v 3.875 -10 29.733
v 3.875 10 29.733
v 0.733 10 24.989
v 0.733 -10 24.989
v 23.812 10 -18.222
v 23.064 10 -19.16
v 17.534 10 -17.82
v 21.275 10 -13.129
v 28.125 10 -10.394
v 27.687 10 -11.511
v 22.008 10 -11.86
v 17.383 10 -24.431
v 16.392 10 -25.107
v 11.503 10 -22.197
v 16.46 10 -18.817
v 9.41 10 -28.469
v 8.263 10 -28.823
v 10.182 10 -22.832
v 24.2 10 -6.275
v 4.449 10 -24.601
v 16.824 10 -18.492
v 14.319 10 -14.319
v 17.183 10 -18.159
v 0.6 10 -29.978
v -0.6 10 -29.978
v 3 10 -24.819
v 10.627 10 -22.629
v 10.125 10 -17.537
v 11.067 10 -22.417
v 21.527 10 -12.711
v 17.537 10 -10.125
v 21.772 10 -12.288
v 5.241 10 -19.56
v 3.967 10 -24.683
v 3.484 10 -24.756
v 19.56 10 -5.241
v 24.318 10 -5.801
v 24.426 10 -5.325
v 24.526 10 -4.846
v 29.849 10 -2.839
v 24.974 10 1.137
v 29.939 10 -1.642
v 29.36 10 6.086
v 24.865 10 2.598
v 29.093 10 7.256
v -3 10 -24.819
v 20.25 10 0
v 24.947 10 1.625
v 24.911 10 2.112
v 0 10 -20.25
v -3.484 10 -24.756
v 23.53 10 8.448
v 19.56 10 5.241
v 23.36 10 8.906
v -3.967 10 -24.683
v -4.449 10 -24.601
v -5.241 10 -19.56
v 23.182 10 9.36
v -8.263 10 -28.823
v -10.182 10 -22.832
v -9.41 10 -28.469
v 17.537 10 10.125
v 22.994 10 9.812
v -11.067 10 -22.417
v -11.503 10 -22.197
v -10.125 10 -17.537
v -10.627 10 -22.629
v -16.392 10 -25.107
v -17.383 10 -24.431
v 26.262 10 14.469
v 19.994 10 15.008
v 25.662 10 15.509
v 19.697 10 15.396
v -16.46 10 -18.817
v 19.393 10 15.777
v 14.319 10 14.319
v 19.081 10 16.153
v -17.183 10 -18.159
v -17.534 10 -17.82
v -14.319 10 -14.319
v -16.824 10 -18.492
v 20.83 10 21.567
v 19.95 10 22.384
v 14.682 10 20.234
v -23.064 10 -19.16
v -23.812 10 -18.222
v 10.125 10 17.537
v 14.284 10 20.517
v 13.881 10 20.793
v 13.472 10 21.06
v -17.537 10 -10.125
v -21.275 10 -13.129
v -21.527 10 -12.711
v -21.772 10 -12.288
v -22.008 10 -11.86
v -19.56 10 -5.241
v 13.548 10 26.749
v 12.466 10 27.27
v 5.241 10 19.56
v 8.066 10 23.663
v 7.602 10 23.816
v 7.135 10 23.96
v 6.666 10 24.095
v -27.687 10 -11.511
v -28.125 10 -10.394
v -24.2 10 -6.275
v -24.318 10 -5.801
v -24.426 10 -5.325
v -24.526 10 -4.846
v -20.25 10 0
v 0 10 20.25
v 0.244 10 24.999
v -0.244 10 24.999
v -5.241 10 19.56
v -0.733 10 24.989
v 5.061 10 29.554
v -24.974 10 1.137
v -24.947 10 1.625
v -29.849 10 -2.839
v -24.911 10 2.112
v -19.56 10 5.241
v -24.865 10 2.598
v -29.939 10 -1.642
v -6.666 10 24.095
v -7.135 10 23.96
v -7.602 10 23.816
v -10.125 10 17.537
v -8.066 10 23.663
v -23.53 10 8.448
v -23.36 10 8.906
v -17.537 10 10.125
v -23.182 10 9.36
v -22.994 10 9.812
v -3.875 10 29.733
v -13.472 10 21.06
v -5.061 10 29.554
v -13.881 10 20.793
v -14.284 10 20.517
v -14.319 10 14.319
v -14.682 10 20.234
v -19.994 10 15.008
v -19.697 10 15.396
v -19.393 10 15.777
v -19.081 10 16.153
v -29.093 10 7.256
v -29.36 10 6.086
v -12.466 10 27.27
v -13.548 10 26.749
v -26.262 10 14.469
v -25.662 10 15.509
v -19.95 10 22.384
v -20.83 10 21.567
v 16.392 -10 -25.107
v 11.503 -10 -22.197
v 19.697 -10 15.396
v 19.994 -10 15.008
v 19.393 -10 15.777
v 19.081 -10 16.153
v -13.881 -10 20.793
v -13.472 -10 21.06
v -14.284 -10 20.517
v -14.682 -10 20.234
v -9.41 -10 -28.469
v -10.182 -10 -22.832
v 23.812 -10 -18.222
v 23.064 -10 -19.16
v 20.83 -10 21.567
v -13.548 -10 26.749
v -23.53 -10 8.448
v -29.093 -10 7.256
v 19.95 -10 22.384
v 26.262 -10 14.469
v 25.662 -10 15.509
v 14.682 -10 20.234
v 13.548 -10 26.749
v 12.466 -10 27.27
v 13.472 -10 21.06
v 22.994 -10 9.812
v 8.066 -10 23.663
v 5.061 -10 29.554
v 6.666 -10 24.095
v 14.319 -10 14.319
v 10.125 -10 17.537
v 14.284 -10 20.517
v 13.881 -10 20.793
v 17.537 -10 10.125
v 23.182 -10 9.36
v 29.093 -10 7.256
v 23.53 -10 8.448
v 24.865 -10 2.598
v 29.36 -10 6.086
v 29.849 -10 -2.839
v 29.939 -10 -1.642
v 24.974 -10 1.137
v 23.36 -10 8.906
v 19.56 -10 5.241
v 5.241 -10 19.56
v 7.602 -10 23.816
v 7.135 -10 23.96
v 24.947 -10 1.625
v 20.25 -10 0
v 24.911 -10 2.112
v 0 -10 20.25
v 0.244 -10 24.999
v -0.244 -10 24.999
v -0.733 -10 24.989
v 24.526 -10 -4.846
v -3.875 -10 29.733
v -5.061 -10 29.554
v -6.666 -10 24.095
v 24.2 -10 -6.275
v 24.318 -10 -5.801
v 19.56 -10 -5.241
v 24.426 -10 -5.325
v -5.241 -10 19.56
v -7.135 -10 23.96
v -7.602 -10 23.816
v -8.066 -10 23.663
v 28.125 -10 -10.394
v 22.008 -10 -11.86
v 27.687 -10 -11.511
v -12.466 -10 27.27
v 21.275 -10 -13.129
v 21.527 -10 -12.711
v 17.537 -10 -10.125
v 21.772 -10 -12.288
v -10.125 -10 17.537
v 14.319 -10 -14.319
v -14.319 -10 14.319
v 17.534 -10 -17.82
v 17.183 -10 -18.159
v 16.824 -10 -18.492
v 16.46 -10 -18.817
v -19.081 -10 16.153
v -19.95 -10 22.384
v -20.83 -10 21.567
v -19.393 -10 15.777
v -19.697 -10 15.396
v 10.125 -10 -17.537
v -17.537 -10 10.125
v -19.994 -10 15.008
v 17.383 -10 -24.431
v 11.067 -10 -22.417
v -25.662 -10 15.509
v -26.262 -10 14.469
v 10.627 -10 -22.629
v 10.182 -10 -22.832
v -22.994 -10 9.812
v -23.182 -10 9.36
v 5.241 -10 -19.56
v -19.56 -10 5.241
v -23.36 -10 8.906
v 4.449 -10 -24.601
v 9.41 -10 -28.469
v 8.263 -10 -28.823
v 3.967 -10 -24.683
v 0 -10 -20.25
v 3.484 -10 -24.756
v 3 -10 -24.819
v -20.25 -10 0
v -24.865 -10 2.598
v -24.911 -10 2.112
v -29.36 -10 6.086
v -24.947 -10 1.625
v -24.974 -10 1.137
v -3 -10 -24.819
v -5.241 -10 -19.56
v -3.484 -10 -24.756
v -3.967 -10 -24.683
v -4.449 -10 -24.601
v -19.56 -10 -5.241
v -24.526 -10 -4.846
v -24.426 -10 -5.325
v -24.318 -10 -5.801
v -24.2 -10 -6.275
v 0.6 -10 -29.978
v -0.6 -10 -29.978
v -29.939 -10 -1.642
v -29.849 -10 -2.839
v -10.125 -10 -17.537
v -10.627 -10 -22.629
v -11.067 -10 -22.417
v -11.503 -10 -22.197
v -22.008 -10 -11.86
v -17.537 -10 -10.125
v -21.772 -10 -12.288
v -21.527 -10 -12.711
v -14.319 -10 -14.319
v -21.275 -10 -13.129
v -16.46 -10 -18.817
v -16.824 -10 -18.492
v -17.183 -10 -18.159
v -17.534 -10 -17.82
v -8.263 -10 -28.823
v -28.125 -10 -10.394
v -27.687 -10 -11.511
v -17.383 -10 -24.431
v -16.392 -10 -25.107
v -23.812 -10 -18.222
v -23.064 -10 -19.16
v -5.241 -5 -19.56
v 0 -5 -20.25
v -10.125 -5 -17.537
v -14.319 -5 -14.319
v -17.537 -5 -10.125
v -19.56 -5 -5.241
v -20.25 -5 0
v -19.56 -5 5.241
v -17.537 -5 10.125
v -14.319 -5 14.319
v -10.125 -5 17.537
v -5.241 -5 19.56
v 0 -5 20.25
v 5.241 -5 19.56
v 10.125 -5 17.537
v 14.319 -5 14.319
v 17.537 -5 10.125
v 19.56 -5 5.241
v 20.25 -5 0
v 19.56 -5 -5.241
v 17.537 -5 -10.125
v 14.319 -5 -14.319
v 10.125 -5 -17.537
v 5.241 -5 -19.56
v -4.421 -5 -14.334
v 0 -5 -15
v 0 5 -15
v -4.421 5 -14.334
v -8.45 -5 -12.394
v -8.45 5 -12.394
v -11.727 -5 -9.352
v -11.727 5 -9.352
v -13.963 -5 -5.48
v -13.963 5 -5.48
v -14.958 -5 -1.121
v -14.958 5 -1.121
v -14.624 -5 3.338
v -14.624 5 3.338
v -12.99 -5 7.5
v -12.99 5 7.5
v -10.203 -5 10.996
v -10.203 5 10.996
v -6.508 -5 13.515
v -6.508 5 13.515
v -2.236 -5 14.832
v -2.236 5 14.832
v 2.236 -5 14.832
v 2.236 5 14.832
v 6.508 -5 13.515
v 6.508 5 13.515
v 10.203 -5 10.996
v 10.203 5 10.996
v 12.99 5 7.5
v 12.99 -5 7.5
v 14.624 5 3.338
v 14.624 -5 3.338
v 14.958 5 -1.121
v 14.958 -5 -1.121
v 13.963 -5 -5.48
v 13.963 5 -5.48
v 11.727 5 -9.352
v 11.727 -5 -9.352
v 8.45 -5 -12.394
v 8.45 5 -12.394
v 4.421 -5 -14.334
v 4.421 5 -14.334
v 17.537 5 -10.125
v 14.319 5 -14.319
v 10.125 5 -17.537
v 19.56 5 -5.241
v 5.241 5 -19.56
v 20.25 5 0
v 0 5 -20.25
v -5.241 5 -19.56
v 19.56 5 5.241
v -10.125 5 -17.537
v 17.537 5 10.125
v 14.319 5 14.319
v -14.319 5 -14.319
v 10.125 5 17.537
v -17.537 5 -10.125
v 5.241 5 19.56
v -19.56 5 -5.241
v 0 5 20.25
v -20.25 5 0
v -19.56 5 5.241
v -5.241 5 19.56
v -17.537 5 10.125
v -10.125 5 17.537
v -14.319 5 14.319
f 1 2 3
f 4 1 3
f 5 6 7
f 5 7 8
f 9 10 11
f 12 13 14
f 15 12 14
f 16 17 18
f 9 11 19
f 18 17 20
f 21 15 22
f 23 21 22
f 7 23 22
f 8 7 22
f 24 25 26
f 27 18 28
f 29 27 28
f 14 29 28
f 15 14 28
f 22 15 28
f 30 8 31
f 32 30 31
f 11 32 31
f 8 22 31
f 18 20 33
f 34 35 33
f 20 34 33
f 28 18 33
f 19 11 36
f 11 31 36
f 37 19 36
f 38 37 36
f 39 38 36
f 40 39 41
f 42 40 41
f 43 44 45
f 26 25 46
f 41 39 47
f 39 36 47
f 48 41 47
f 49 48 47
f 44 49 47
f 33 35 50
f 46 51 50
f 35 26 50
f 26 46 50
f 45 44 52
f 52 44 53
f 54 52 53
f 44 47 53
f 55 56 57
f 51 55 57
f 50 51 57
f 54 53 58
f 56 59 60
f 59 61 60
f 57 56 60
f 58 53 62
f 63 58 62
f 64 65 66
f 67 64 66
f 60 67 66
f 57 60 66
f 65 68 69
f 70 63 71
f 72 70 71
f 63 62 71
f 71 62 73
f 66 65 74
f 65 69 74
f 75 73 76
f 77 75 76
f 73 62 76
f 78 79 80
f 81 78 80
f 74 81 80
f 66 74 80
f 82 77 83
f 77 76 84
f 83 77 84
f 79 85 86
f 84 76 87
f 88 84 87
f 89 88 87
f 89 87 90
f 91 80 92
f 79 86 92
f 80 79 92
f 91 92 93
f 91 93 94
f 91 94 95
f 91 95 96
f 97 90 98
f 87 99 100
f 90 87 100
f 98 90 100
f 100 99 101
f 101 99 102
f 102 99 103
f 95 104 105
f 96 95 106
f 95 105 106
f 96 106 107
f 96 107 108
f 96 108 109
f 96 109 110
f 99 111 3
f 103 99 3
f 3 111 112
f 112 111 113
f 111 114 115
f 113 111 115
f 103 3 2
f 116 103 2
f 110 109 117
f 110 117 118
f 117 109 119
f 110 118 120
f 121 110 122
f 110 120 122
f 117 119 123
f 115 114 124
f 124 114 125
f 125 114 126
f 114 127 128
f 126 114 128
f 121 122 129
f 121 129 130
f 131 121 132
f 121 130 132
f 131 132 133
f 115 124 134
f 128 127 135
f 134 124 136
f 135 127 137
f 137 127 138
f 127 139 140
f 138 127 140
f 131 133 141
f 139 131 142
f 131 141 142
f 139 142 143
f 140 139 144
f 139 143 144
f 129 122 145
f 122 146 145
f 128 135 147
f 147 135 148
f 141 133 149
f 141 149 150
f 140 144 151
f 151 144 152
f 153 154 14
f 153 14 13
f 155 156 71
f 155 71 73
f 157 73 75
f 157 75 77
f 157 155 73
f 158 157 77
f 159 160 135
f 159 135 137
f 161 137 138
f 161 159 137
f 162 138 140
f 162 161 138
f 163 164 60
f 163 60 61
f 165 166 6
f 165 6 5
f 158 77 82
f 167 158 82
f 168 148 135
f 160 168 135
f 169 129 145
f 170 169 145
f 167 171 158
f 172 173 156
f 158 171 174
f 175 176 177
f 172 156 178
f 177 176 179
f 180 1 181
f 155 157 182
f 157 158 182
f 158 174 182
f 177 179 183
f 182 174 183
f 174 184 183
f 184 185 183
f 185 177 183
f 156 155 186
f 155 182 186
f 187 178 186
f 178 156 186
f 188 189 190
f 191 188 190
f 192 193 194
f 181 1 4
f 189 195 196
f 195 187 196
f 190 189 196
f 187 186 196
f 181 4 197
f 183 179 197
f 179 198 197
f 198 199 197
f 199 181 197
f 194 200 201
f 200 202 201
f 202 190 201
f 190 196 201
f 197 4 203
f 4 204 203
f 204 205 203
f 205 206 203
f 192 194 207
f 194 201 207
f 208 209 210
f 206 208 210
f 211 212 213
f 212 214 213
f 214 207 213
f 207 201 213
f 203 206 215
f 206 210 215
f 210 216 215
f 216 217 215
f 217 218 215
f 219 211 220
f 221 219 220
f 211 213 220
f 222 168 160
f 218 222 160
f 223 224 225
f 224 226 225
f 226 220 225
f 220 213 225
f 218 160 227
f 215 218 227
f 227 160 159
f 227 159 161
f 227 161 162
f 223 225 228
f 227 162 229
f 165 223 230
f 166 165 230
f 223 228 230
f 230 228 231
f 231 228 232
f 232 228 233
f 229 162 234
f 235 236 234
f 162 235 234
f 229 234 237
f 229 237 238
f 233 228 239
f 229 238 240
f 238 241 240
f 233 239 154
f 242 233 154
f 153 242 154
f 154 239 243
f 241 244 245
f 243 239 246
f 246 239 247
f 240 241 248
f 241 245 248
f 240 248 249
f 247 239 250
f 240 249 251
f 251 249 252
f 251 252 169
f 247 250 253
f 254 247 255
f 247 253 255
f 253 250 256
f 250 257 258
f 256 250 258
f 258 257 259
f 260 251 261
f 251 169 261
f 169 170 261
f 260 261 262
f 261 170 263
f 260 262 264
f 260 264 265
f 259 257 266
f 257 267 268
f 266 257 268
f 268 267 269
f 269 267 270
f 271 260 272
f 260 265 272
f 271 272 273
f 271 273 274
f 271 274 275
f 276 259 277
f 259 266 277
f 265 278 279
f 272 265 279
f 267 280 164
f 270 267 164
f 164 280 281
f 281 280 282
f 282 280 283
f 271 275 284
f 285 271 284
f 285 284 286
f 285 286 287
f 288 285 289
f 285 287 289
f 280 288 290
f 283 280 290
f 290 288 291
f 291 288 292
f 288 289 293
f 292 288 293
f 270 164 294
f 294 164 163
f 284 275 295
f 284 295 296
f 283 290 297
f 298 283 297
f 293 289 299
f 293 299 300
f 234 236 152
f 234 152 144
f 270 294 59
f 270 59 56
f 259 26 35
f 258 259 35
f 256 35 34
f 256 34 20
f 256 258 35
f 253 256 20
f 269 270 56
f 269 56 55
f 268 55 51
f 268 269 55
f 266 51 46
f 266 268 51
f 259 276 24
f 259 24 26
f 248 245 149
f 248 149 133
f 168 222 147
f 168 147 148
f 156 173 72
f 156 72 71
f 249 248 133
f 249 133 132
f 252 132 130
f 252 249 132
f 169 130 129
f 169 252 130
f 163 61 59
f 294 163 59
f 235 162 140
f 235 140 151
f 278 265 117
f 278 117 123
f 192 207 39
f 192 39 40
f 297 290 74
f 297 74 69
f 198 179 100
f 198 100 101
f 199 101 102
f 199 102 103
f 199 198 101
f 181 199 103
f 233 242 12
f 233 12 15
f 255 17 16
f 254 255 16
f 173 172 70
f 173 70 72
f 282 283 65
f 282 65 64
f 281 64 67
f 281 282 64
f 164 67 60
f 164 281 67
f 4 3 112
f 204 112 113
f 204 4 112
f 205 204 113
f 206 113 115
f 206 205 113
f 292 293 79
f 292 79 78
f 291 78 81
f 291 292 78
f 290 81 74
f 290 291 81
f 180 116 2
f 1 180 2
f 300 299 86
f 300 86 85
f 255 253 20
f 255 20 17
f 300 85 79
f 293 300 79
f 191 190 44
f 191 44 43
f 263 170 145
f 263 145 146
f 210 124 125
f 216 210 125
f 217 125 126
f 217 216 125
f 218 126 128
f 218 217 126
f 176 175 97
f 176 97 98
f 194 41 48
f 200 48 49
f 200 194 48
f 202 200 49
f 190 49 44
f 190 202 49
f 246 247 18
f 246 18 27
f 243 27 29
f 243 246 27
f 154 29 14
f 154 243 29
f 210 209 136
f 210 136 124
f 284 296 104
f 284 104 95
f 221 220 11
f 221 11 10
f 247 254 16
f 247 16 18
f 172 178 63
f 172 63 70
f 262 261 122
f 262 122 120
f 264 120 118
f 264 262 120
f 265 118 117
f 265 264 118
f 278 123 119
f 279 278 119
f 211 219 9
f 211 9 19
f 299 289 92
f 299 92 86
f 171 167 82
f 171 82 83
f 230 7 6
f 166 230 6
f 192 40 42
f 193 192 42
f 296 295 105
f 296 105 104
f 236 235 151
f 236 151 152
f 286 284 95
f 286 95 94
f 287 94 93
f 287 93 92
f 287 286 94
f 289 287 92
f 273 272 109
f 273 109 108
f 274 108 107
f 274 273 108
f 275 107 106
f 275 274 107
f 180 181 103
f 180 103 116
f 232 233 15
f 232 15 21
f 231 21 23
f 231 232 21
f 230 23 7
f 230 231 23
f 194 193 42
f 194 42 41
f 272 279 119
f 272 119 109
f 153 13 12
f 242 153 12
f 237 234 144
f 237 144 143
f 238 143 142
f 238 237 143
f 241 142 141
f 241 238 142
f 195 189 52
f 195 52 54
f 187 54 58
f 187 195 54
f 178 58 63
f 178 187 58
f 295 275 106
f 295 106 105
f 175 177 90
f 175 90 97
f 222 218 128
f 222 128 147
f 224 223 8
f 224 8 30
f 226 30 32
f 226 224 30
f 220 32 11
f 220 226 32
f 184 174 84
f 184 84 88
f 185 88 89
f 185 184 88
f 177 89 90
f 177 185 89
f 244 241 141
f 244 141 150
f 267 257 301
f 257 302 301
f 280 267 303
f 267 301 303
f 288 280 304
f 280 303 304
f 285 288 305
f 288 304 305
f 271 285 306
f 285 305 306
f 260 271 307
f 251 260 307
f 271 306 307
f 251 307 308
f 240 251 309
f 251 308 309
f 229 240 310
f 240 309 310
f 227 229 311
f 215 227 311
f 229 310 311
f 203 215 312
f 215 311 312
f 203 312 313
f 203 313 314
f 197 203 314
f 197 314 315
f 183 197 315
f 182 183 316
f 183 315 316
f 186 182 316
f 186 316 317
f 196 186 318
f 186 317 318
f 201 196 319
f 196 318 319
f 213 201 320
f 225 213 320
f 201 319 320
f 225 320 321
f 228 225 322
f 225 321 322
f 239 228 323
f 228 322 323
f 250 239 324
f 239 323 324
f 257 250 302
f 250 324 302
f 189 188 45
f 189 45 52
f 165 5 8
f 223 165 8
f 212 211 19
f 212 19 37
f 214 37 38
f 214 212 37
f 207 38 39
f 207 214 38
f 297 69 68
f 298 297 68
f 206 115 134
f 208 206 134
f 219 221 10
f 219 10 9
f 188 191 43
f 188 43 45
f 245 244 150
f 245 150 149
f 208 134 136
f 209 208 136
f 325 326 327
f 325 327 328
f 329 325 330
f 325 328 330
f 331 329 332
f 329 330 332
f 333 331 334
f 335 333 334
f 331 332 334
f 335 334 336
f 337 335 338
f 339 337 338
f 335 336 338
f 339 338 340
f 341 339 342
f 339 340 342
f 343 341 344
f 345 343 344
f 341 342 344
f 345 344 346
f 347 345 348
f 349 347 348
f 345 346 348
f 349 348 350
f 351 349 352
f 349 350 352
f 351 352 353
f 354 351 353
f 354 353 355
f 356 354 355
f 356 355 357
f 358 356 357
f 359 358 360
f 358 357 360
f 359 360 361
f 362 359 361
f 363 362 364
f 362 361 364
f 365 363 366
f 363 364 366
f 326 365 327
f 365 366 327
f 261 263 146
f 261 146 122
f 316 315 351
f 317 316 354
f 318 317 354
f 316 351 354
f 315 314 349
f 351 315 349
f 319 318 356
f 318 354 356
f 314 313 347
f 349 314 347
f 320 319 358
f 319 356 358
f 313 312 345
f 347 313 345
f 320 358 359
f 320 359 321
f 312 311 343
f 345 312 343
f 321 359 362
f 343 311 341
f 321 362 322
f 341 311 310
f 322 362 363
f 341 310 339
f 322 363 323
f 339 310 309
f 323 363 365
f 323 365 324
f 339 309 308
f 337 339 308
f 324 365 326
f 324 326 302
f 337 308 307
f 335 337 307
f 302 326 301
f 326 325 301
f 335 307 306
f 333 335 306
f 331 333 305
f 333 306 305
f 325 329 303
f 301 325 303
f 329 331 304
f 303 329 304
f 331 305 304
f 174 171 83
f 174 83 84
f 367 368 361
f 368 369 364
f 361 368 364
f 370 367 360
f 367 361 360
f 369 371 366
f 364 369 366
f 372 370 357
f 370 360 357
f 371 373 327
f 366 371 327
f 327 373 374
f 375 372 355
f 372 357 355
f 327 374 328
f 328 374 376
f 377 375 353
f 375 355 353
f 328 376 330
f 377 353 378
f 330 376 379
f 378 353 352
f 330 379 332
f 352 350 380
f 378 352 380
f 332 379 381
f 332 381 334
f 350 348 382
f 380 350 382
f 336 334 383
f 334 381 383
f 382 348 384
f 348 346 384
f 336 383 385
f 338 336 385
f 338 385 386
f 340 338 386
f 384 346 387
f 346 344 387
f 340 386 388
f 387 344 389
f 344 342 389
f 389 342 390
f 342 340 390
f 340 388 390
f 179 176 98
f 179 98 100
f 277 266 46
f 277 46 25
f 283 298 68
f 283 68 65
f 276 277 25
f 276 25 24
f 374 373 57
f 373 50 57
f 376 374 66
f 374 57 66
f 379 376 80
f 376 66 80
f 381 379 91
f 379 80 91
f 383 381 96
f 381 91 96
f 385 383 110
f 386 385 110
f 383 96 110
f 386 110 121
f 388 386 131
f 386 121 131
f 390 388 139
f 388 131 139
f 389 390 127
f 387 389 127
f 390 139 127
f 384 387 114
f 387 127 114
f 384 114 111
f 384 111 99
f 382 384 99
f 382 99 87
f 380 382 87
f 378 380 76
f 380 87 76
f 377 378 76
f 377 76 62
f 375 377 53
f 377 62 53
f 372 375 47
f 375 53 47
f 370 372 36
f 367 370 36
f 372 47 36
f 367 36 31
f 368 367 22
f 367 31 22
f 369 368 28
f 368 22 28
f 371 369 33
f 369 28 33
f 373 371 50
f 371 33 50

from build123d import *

# Parameters (mm, degrees)
CUT_EXTRUDE1_DEPTH      = 47.904157598
CUT_EXTRUDE1_DEPTH_BACK = 47.904157598
SKETCH2_R               = 30


with BuildPart() as part:
    # Sketch1 → Revolve1 (revolve)
    with BuildSketch(Plane(origin=(0, 0, 0), x_dir=(0, 0, -1), z_dir=(1, 0, 0))):
        Polygon((20.25, 10), (30, 10), (30, -10), (20.25, -10), (20.25, -5), (15, -5), (15, 5), (20.25, 5), align=None)
    revolve(axis=Axis((0, 0, 0), (0, 1, 0)))

    # Sketch2 → Cut-Extrude1 (cut, two sides: drawn at the far end of the back side and taken through both)
    with BuildSketch(Plane(origin=(0, 10, 0), x_dir=(1, 0, 0), z_dir=(0, 1, 0)).offset(-CUT_EXTRUDE1_DEPTH_BACK)):
        Circle(SKETCH2_R)
        with BuildLine():
            Line((-3, 24.819347292), (-0.6, 29.978082123))
            Line((-0.6, 29.978082123), (0.6, 29.978082123))
            Line((0.6, 29.978082123), (3, 24.819347292))
            ThreePointArc((3, 24.819347292), (3.726056654, 24.720770656), (4.448912622, 24.600958853))
            Line((4.448912622, 24.600958853), (8.262851141, 28.823093151))
            Line((8.262851141, 28.823093151), (9.409538508, 28.469386942))
            Line((9.409538508, 28.469386942), (10.182349457, 22.832427806))
            ThreePointArc((10.182349457, 22.832427806), (10.847093478, 22.524221698), (11.502519835, 22.19666726))
            Line((11.502519835, 22.19666726), (16.391511698, 25.107045865))
            Line((16.391511698, 25.107045865), (17.382998227, 24.431061795))
            Line((17.382998227, 24.431061795), (16.459952481, 18.816746912))
            ThreePointArc((16.459952481, 18.816746912), (17.004318444, 18.326296796), (17.534077682, 17.820104373))
            Line((17.534077682, 17.820104373), (23.063714507, 19.160127373))
            Line((23.063714507, 19.160127373), (23.811902269, 18.221929594))
            Line((23.811902269, 18.221929594), (21.275016493, 13.129115478))
            ThreePointArc((21.275016493, 13.129115478), (21.650635095, 12.5), (22.007655779, 11.86014701))
            Line((22.007655779, 11.86014701), (27.686605069, 11.510747481))
            Line((27.686605069, 11.510747481), (28.125014298, 10.393698982))
            Line((28.125014298, 10.393698982), (24.199701926, 6.274904518))
            ThreePointArc((24.199701926, 6.274904518), (24.373197805, 5.563023349), (24.525757082, 4.846363537))
            Line((24.525757082, 4.846363537), (29.849419269, 2.838587161))
            Line((29.849419269, 2.838587161), (29.939095382, 1.641942604))
            Line((29.939095382, 1.641942604), (24.974137644, -1.136859246))
            ThreePointArc((24.974137644, -1.136859246), (24.93009493, -1.86825234), (24.864637239, -2.598040603))
            Line((24.864637239, -2.598040603), (29.359981576, -6.085794085))
            Line((29.359981576, -6.085794085), (29.092956455, -7.25570758))
            Line((29.092956455, -7.25570758), (23.529511635, -8.447608076))
            ThreePointArc((23.529511635, -8.447608076), (23.271843716, -9.133525609), (22.99418526, -9.811597435))
            Line((22.99418526, -9.811597435), (26.261780675, -14.469425819))
            Line((26.261780675, -14.469425819), (25.661780675, -15.508656304))
            Line((25.661780675, -15.508656304), (19.99418526, -15.007749857))
            ThreePointArc((19.99418526, -15.007749857), (19.545787062, -15.587245046), (19.080599013, -16.153350777))
            Line((19.080599013, -16.153350777), (20.830105314, -21.567385572))
            Line((20.830105314, -21.567385572), (19.950443068, -22.383592857))
            Line((19.950443068, -22.383592857), (14.682287782, -20.234387203))
            ThreePointArc((14.682287782, -20.234387203), (14.083001452, -20.655969358), (13.471617809, -21.059808014))
            Line((13.471617809, -21.059808014), (13.547583684, -26.748988469))
            Line((13.547583684, -26.748988469), (12.466421042, -27.269648956))
            Line((12.466421042, -27.269648956), (8.065804602, -23.663110449))
            ThreePointArc((8.065804602, -23.663110449), (7.36887936, -23.889320145), (6.665624244, -24.095008891))
            Line((6.665624244, -24.095008891), (5.061299791, -29.553826355))
            Line((5.061299791, -29.553826355), (3.8747028, -29.732677074))
            Line((3.8747028, -29.732677074), (0.732639287, -24.989262488))
            ThreePointArc((0.732639287, -24.989262488), (0, -25), (-0.732639287, -24.989262488))
            Line((-0.732639287, -24.989262488), (-3.8747028, -29.732677074))
            Line((-3.8747028, -29.732677074), (-5.061299791, -29.553826355))
            Line((-5.061299791, -29.553826355), (-6.665624244, -24.095008891))
            ThreePointArc((-6.665624244, -24.095008891), (-7.36887936, -23.889320145), (-8.065804602, -23.663110449))
            Line((-8.065804602, -23.663110449), (-12.466421042, -27.269648956))
            Line((-12.466421042, -27.269648956), (-13.547583684, -26.748988469))
            Line((-13.547583684, -26.748988469), (-13.471617809, -21.059808014))
            ThreePointArc((-13.471617809, -21.059808014), (-14.083001452, -20.655969358), (-14.682287782, -20.234387203))
            Line((-14.682287782, -20.234387203), (-19.950443068, -22.383592857))
            Line((-19.950443068, -22.383592857), (-20.830105314, -21.567385572))
            Line((-20.830105314, -21.567385572), (-19.080599013, -16.153350777))
            ThreePointArc((-19.080599013, -16.153350777), (-19.545787062, -15.587245046), (-19.99418526, -15.007749857))
            Line((-19.99418526, -15.007749857), (-25.661780675, -15.508656304))
            Line((-25.661780675, -15.508656304), (-26.261780675, -14.469425819))
            Line((-26.261780675, -14.469425819), (-22.99418526, -9.811597435))
            ThreePointArc((-22.99418526, -9.811597435), (-23.271843716, -9.133525609), (-23.529511635, -8.447608076))
            Line((-23.529511635, -8.447608076), (-29.092956455, -7.25570758))
            Line((-29.092956455, -7.25570758), (-29.359981576, -6.085794085))
            Line((-29.359981576, -6.085794085), (-24.864637239, -2.598040603))
            ThreePointArc((-24.864637239, -2.598040603), (-24.93009493, -1.86825234), (-24.974137644, -1.136859246))
            Line((-24.974137644, -1.136859246), (-29.939095382, 1.641942604))
            Line((-29.939095382, 1.641942604), (-29.849419269, 2.838587161))
            Line((-29.849419269, 2.838587161), (-24.525757082, 4.846363537))
            ThreePointArc((-24.525757082, 4.846363537), (-24.373197805, 5.563023349), (-24.199701926, 6.274904518))
            Line((-24.199701926, 6.274904518), (-28.125014298, 10.393698982))
            Line((-28.125014298, 10.393698982), (-27.686605069, 11.510747481))
            Line((-27.686605069, 11.510747481), (-22.007655779, 11.86014701))
            ThreePointArc((-22.007655779, 11.86014701), (-21.650635095, 12.5), (-21.275016493, 13.129115478))
            Line((-21.275016493, 13.129115478), (-23.811902269, 18.221929594))
            Line((-23.811902269, 18.221929594), (-23.063714507, 19.160127373))
            Line((-23.063714507, 19.160127373), (-17.534077682, 17.820104373))
            ThreePointArc((-17.534077682, 17.820104373), (-17.004318444, 18.326296796), (-16.459952481, 18.816746912))
            Line((-16.459952481, 18.816746912), (-17.382998227, 24.431061795))
            Line((-17.382998227, 24.431061795), (-16.391511698, 25.107045865))
            Line((-16.391511698, 25.107045865), (-11.502519835, 22.19666726))
            ThreePointArc((-11.502519835, 22.19666726), (-10.847093478, 22.524221698), (-10.182349457, 22.832427806))
            Line((-10.182349457, 22.832427806), (-9.409538508, 28.469386942))
            Line((-9.409538508, 28.469386942), (-8.262851141, 28.823093151))
            Line((-8.262851141, 28.823093151), (-4.448912622, 24.600958853))
            ThreePointArc((-4.448912622, 24.600958853), (-3.726056654, 24.720770656), (-3, 24.819347292))
        make_face(mode=Mode.SUBTRACT)
    extrude(amount=CUT_EXTRUDE1_DEPTH + CUT_EXTRUDE1_DEPTH_BACK, mode=Mode.SUBTRACT)


solid = part.part
